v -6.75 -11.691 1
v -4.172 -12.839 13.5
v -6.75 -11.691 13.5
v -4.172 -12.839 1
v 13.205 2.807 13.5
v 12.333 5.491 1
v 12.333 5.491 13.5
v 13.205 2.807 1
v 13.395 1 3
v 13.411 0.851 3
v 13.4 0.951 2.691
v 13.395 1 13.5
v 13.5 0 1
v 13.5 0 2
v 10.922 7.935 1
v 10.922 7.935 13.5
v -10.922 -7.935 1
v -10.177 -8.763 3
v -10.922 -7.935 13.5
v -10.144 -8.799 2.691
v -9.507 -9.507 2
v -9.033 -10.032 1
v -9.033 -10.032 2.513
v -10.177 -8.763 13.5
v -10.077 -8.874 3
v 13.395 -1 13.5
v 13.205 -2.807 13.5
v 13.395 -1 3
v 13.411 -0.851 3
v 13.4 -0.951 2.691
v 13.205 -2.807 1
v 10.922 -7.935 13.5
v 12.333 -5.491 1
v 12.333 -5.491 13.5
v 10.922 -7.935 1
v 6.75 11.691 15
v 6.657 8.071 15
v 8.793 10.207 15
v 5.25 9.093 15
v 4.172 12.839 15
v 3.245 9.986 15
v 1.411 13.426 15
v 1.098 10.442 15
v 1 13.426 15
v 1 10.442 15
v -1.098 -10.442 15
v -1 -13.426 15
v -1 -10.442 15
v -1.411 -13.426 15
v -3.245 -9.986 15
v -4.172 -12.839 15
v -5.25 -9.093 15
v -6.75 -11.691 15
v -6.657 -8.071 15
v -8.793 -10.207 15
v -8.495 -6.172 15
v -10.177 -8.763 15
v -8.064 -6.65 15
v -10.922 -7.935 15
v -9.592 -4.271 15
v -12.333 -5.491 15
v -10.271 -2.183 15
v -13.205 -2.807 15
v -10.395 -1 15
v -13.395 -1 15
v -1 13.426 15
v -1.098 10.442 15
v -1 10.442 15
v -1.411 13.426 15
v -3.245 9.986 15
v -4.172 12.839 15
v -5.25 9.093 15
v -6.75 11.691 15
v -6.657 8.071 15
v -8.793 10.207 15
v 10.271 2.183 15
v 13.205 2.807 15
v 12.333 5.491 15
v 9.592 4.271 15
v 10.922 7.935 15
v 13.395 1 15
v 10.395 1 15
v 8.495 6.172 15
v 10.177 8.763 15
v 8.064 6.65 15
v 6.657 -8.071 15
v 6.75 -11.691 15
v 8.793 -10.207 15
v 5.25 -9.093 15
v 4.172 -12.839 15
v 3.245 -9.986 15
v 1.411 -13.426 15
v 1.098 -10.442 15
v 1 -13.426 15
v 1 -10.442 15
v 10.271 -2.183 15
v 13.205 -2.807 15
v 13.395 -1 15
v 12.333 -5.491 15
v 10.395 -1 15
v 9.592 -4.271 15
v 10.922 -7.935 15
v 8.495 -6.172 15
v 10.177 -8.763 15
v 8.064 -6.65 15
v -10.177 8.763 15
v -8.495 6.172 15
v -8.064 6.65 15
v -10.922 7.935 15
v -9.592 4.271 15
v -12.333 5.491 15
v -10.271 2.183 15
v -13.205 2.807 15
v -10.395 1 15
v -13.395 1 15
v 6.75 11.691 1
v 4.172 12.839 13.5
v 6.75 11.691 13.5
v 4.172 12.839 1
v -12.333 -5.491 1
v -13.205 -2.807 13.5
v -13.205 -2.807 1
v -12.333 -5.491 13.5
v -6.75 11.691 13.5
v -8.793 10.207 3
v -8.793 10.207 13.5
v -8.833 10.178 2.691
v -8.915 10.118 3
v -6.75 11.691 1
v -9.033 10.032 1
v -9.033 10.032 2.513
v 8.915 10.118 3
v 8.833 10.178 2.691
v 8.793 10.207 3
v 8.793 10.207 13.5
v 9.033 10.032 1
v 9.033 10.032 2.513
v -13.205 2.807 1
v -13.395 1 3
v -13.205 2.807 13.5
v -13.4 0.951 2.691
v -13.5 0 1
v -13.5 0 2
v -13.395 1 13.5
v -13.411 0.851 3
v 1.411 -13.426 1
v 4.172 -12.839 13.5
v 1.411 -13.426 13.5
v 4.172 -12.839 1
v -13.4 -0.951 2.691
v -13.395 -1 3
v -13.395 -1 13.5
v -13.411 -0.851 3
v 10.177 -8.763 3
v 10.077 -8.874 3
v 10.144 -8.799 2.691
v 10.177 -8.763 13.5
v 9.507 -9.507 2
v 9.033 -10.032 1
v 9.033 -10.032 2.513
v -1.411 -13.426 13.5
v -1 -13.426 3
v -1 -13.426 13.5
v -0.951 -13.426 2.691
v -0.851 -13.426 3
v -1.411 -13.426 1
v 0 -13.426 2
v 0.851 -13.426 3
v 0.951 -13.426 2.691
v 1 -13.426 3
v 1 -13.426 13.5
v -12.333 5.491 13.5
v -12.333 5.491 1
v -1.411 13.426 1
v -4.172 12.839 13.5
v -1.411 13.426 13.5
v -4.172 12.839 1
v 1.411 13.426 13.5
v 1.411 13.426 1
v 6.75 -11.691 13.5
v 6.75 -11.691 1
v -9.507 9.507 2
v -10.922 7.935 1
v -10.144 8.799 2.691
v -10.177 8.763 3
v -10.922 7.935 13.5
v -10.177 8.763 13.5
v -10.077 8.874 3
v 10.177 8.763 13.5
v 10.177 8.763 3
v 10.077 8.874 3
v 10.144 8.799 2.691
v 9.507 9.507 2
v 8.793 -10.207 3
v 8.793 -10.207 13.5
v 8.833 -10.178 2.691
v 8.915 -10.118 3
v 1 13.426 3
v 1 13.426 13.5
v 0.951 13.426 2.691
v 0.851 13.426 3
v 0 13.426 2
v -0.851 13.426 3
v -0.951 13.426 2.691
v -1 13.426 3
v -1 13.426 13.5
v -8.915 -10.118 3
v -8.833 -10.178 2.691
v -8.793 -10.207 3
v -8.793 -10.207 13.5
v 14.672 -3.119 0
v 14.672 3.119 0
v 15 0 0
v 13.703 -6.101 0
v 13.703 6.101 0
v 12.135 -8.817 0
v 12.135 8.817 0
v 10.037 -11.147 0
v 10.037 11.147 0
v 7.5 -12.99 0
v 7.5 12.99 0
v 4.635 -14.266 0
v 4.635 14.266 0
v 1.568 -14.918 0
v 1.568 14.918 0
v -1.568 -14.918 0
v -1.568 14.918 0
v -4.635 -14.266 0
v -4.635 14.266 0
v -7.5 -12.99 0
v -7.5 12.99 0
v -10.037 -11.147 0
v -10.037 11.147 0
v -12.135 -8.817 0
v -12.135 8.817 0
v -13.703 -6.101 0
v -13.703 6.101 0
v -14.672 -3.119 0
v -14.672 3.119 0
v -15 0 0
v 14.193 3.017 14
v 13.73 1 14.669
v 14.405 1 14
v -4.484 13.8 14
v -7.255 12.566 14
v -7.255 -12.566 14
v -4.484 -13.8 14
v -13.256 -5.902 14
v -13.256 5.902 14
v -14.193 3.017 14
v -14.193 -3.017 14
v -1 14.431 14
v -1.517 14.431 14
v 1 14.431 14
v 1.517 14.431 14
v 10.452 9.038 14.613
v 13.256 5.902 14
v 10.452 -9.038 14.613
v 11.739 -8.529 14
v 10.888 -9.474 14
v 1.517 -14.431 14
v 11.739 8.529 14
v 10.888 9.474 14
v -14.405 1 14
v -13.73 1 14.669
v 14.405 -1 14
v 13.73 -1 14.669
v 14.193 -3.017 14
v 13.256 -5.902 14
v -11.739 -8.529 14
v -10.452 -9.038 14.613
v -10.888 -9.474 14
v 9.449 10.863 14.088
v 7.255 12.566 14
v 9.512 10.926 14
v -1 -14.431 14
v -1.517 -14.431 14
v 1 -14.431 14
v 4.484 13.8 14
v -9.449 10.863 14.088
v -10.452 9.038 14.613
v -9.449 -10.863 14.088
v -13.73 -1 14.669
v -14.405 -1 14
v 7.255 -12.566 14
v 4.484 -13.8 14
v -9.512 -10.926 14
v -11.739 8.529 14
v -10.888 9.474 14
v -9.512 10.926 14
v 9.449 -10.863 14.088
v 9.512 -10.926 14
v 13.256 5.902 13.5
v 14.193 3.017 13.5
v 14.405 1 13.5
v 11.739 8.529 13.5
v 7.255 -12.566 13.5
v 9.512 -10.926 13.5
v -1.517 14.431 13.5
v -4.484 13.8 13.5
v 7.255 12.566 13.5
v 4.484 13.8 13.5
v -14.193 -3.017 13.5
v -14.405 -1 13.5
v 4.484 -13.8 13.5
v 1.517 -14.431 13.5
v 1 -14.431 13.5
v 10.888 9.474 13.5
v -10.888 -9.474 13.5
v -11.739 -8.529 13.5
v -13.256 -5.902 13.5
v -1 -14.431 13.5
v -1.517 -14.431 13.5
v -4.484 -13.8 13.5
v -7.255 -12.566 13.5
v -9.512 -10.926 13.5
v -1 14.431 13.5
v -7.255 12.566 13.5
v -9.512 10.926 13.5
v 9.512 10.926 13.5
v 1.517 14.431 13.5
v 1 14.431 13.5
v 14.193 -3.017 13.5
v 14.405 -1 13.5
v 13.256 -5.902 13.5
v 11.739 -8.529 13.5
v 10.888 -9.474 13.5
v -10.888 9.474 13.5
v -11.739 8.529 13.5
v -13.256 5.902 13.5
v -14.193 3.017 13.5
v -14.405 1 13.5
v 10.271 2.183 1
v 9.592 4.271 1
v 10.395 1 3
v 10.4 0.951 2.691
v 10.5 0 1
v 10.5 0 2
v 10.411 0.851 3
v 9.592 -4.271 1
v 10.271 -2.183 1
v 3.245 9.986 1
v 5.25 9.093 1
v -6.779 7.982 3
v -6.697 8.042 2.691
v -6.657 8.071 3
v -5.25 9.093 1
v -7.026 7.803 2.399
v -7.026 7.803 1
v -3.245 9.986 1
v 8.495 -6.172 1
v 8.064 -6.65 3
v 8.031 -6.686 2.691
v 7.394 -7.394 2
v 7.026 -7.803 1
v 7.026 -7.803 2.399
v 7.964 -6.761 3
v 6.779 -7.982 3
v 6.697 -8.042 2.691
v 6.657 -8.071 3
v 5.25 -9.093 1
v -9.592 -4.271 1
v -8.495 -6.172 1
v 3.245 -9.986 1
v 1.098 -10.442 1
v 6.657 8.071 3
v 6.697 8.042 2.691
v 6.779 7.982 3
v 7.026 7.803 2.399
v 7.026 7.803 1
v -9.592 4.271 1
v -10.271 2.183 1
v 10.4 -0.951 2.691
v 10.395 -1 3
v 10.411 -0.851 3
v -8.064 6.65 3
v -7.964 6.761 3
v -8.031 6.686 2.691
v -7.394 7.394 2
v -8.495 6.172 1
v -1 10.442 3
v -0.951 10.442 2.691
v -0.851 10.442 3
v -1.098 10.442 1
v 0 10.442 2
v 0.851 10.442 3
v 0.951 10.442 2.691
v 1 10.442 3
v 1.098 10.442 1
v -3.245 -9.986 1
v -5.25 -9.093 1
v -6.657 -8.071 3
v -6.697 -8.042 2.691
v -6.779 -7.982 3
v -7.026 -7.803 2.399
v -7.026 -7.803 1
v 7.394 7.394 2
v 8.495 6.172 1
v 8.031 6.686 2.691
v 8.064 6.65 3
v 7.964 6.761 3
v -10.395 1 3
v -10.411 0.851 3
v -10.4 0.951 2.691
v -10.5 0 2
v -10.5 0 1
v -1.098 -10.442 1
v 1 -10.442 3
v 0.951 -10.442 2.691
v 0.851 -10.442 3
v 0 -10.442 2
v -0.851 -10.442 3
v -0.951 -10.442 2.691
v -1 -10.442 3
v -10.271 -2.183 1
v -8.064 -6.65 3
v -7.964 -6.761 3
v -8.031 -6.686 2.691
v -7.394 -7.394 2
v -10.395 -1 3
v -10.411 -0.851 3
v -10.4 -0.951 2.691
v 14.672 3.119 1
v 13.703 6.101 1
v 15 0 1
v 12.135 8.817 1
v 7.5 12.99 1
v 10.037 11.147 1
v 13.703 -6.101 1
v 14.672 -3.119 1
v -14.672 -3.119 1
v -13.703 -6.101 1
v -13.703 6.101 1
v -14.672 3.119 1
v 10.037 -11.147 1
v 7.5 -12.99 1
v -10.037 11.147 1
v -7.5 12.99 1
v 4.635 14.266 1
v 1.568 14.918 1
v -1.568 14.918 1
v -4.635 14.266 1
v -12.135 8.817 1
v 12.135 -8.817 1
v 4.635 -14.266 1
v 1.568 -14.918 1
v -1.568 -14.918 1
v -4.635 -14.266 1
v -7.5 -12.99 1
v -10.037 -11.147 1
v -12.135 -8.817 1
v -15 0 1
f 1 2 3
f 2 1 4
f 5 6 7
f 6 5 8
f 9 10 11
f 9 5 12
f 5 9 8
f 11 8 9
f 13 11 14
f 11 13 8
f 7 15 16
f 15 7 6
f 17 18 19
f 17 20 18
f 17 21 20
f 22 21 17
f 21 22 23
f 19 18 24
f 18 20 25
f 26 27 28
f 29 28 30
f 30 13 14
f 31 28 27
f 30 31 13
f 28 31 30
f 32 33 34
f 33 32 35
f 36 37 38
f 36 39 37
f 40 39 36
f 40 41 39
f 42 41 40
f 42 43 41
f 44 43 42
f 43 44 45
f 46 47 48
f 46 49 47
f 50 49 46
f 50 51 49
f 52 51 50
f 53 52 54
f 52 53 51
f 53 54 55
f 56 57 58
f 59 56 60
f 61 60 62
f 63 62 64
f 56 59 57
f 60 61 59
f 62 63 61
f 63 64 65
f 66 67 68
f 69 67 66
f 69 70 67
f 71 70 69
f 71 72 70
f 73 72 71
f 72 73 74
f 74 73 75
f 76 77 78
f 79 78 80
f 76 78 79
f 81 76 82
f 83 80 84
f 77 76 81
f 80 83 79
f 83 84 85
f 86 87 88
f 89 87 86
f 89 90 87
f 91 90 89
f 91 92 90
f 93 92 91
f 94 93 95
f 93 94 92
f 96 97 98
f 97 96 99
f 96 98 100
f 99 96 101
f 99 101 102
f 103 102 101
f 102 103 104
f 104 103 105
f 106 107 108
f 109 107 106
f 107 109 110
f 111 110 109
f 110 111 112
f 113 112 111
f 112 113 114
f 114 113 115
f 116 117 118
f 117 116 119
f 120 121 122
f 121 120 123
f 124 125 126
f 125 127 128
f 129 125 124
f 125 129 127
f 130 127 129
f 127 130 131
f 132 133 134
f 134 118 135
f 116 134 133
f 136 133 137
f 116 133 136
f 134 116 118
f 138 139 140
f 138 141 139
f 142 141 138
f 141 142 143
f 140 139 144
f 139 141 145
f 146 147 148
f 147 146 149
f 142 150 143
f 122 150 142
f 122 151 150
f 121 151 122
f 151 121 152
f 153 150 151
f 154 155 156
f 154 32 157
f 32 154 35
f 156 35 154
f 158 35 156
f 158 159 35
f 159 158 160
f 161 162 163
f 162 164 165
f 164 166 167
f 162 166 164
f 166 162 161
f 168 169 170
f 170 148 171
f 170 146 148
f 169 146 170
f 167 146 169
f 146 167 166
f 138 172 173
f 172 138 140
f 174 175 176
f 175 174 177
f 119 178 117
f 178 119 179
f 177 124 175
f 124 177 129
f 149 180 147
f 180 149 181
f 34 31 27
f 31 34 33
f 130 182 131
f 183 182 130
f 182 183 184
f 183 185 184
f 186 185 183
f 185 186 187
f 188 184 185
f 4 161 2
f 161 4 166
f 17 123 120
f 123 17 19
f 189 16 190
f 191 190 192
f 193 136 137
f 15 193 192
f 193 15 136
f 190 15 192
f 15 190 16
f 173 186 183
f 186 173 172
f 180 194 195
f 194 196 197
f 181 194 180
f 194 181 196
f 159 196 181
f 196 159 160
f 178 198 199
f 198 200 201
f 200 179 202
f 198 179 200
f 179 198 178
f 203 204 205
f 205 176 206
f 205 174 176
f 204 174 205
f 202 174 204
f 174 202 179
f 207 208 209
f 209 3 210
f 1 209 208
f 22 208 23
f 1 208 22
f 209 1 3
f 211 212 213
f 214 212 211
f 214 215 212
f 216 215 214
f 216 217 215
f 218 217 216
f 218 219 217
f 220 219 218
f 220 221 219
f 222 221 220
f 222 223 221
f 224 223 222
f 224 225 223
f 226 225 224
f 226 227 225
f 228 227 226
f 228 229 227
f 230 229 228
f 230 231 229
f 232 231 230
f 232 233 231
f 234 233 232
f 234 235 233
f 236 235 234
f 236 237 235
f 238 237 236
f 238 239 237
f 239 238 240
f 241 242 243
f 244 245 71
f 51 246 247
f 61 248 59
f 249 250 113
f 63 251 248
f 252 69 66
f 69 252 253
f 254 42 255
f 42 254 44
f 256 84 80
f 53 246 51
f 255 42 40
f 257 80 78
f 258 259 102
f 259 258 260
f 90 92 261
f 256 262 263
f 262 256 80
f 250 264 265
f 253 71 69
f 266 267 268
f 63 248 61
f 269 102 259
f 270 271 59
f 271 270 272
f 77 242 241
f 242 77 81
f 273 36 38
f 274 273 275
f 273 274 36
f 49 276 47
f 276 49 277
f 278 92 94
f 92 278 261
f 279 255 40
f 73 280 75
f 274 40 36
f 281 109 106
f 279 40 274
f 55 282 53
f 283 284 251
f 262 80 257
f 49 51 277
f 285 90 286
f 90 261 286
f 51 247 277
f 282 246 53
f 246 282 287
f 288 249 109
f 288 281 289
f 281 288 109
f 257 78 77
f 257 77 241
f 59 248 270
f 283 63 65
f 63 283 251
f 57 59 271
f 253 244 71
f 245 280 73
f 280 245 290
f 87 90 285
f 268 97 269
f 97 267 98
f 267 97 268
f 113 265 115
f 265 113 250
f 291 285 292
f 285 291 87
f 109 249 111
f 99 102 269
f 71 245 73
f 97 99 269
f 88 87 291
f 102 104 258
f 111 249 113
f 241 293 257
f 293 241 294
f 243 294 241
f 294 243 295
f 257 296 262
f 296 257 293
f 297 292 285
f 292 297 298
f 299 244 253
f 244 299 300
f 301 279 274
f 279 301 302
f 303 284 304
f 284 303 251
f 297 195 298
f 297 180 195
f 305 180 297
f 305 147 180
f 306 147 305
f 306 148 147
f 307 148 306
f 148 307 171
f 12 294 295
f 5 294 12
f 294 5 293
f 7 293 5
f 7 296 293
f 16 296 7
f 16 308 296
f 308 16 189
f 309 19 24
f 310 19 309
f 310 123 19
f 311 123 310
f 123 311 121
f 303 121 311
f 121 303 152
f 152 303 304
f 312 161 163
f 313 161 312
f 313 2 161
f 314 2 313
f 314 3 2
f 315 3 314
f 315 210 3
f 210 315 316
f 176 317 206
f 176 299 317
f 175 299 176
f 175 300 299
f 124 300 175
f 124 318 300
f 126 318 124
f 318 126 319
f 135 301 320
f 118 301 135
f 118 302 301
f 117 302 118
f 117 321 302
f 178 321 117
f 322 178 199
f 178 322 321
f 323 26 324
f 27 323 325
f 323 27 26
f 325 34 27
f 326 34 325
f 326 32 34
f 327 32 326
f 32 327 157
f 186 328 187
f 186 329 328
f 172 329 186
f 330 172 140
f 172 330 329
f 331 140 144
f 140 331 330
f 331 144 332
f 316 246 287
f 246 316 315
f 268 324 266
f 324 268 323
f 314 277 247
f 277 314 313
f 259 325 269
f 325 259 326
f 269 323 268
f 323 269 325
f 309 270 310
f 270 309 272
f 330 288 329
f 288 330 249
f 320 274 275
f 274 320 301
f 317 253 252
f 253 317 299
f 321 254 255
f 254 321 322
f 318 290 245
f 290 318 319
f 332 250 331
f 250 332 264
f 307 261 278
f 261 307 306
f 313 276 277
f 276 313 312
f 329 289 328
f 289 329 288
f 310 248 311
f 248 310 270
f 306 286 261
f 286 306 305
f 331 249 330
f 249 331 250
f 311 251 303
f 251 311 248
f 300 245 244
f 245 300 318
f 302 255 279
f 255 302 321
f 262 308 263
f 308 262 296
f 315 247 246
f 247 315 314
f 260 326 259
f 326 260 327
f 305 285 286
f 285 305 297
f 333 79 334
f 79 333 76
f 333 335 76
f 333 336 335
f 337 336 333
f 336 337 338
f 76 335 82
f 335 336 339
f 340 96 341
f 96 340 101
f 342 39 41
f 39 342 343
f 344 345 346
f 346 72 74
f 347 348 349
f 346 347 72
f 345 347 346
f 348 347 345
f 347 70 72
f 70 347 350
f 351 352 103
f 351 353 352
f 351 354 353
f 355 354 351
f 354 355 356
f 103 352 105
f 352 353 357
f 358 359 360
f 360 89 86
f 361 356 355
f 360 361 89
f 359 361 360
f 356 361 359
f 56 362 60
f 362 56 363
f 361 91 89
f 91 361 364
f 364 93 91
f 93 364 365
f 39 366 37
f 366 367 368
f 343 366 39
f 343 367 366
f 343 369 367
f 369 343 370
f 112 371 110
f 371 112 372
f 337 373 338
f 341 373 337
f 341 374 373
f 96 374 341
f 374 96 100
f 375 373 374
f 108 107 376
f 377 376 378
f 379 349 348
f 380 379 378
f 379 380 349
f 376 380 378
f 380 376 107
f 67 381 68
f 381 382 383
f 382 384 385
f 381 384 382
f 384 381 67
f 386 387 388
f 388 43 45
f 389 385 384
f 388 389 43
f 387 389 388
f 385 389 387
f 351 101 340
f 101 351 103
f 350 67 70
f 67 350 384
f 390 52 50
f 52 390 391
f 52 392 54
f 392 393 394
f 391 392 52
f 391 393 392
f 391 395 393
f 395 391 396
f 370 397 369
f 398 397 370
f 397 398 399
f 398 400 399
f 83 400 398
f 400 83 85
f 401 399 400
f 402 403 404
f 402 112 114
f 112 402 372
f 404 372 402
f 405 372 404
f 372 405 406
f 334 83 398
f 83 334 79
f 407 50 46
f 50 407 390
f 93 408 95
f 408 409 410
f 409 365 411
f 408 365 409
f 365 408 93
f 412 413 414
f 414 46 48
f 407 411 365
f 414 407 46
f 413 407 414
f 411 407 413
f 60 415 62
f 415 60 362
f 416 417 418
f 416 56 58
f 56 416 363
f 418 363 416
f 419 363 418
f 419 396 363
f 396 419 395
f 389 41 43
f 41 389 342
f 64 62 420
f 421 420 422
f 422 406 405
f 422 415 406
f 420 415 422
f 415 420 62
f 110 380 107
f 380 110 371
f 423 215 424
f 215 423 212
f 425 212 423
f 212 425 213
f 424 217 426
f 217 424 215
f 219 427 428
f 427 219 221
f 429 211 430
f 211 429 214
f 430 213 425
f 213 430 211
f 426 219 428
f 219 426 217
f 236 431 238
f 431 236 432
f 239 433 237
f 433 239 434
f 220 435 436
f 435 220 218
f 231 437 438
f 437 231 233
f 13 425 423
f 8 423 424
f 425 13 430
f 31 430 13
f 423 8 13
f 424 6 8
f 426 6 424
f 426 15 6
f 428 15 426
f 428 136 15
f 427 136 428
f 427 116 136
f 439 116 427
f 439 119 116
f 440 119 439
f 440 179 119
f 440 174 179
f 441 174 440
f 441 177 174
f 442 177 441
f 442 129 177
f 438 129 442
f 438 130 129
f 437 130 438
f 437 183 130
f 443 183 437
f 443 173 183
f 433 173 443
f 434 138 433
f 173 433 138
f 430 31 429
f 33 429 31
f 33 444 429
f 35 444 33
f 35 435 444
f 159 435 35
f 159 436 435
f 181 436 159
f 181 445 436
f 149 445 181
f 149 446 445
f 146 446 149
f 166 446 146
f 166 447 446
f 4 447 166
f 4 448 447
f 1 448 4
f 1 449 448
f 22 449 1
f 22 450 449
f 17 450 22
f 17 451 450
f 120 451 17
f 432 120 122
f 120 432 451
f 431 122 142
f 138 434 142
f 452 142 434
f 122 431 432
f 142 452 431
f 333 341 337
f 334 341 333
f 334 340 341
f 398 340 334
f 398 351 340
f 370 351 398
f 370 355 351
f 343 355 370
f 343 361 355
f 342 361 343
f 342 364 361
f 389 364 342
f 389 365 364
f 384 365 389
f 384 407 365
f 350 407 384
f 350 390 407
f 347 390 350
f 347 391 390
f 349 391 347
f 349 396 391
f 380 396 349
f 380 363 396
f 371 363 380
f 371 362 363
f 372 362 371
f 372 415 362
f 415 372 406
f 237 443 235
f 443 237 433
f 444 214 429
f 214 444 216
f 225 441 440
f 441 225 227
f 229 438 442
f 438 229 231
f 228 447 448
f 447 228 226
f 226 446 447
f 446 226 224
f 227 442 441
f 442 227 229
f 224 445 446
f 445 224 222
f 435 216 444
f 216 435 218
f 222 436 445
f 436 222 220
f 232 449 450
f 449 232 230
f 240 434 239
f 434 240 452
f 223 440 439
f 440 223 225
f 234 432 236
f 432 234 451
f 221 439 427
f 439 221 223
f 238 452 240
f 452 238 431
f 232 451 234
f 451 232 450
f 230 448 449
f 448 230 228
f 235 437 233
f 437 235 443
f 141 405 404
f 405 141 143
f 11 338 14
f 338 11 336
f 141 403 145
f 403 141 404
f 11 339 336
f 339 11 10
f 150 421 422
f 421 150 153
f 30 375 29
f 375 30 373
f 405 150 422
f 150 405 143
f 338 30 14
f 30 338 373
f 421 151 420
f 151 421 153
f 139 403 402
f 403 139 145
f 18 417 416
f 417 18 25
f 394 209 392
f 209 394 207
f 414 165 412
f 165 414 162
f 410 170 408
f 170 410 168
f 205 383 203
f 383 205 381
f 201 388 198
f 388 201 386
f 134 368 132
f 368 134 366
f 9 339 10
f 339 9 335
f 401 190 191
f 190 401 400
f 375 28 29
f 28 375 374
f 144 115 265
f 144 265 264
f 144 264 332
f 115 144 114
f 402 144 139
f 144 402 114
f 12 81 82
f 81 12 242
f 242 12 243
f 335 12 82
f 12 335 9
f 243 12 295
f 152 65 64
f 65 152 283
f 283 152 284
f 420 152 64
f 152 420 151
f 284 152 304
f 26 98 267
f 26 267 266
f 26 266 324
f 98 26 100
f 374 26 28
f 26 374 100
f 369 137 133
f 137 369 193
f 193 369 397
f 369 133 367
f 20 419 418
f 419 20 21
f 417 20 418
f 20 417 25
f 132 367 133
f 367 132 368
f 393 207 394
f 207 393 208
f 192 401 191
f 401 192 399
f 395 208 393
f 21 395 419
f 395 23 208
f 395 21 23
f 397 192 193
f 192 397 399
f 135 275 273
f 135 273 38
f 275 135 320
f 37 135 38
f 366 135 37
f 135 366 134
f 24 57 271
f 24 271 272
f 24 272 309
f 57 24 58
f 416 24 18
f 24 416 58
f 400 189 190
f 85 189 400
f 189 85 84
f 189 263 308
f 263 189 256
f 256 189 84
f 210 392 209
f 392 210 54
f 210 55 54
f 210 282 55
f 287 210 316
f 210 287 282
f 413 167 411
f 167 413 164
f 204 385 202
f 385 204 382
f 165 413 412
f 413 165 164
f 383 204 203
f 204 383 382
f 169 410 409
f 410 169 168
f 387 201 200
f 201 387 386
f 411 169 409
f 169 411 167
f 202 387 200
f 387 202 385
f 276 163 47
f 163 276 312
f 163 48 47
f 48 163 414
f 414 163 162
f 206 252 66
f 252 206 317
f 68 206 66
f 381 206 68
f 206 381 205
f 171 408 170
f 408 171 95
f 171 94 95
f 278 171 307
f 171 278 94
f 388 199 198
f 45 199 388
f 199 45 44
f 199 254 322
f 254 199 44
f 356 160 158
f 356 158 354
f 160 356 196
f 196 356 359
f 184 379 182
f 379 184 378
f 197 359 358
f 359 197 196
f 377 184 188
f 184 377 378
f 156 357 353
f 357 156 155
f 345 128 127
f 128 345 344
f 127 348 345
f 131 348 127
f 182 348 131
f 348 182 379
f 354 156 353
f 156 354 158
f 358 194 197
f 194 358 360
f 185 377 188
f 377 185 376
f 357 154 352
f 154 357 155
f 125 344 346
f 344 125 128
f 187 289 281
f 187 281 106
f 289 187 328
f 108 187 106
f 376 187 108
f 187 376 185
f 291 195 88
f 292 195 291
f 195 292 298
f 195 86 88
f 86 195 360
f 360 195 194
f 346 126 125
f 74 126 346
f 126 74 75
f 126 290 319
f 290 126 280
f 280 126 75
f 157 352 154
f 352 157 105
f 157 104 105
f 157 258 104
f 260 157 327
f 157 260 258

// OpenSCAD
// file: settings-trv.scad
/* TRV settings, TODO: clean up and move generic ones to common settings. */

/*
Valve attachment measurements

All measurements below are used by the test valve connector.
*/

// Screw attributes. At the moment, the only supported combination is:
// diameter: 30, pitch:1.5
screw_diameter=30;
screw_pitch=1.5;
// The screw tolerance allows the screw connector to be scale slightly in order
// to give a bit of tolerance to how snuggly the screw fits the valve
screw_tolerance=0.01;
screw_height=10;
screw_thickness=2;
screw_protusion_number=12;

// Connector attributes
connector_height=15;
connector_slit_number=8; // this has to be an even number (for the moment)
connector_slit_thickness=2;
connector_slit_offset=3;
connector_plate_thickness=1;
// main file
/*
The OpenTRV project licenses this file to you
under the Apache Licence, Version 2.0 (the "Licence");
you may not use this file except in compliance
with the Licence. You may obtain a copy of the Licence at

http://www.apache.org/licenses/LICENSE-2.0

Unless required by applicable law or agreed to in writing,
software distributed under the Licence is distributed on an
"AS IS" BASIS, WITHOUT WARRANTIES OR CONDITIONS OF ANY
KIND, either express or implied. See the Licence for the
specific language governing permissions and limitations
under the Licence.

Author(s) / Copyright (s): Bruno Girin 2013
*/

include <settings-trv.scad>;

screw_radius = screw_diameter / 2;
ext_radius = screw_radius * 13.5 / 15.0;
int_radius = screw_radius * 10.5 / 15.0;
lip_radius = screw_radius * 14.5 / 15.0 + screw_tolerance;
bevel_height = 1;
lip_height = 0.5;
slit_angle = 360 / connector_slit_number;

difference() {
    union() {
        difference() {
            union() {
                cylinder(h = connector_height, r = ext_radius);
                translate([0, 0, connector_height - bevel_height])
                    cylinder(h = bevel_height, r1 = lip_radius, r2 = ext_radius);
                translate([0, 0, connector_height - bevel_height - lip_height])
                    cylinder(h = lip_height, r = lip_radius);
            }
            translate([0, 0, -1])
                cylinder(h = connector_height + 2, r = int_radius);
        }
        cylinder(h = connector_plate_thickness, r = screw_radius);
    }

    for ( i = [0 : connector_slit_number / 2 - 1] ) {
        rotate(a = slit_angle * i, v = [0, 0, 1])
        translate([0, 0, connector_slit_offset]) {
            union() {
                rotate(a = 90, v = [0, 1, 0])
                    translate([0, 0, -screw_radius])
                        cylinder(h = screw_diameter, r = connector_slit_thickness / 2);
                translate([0, 0, screw_radius / 2])
                    cube(size = [screw_diameter, connector_slit_thickness, screw_radius], center = true);
            }
        }
    }
}
